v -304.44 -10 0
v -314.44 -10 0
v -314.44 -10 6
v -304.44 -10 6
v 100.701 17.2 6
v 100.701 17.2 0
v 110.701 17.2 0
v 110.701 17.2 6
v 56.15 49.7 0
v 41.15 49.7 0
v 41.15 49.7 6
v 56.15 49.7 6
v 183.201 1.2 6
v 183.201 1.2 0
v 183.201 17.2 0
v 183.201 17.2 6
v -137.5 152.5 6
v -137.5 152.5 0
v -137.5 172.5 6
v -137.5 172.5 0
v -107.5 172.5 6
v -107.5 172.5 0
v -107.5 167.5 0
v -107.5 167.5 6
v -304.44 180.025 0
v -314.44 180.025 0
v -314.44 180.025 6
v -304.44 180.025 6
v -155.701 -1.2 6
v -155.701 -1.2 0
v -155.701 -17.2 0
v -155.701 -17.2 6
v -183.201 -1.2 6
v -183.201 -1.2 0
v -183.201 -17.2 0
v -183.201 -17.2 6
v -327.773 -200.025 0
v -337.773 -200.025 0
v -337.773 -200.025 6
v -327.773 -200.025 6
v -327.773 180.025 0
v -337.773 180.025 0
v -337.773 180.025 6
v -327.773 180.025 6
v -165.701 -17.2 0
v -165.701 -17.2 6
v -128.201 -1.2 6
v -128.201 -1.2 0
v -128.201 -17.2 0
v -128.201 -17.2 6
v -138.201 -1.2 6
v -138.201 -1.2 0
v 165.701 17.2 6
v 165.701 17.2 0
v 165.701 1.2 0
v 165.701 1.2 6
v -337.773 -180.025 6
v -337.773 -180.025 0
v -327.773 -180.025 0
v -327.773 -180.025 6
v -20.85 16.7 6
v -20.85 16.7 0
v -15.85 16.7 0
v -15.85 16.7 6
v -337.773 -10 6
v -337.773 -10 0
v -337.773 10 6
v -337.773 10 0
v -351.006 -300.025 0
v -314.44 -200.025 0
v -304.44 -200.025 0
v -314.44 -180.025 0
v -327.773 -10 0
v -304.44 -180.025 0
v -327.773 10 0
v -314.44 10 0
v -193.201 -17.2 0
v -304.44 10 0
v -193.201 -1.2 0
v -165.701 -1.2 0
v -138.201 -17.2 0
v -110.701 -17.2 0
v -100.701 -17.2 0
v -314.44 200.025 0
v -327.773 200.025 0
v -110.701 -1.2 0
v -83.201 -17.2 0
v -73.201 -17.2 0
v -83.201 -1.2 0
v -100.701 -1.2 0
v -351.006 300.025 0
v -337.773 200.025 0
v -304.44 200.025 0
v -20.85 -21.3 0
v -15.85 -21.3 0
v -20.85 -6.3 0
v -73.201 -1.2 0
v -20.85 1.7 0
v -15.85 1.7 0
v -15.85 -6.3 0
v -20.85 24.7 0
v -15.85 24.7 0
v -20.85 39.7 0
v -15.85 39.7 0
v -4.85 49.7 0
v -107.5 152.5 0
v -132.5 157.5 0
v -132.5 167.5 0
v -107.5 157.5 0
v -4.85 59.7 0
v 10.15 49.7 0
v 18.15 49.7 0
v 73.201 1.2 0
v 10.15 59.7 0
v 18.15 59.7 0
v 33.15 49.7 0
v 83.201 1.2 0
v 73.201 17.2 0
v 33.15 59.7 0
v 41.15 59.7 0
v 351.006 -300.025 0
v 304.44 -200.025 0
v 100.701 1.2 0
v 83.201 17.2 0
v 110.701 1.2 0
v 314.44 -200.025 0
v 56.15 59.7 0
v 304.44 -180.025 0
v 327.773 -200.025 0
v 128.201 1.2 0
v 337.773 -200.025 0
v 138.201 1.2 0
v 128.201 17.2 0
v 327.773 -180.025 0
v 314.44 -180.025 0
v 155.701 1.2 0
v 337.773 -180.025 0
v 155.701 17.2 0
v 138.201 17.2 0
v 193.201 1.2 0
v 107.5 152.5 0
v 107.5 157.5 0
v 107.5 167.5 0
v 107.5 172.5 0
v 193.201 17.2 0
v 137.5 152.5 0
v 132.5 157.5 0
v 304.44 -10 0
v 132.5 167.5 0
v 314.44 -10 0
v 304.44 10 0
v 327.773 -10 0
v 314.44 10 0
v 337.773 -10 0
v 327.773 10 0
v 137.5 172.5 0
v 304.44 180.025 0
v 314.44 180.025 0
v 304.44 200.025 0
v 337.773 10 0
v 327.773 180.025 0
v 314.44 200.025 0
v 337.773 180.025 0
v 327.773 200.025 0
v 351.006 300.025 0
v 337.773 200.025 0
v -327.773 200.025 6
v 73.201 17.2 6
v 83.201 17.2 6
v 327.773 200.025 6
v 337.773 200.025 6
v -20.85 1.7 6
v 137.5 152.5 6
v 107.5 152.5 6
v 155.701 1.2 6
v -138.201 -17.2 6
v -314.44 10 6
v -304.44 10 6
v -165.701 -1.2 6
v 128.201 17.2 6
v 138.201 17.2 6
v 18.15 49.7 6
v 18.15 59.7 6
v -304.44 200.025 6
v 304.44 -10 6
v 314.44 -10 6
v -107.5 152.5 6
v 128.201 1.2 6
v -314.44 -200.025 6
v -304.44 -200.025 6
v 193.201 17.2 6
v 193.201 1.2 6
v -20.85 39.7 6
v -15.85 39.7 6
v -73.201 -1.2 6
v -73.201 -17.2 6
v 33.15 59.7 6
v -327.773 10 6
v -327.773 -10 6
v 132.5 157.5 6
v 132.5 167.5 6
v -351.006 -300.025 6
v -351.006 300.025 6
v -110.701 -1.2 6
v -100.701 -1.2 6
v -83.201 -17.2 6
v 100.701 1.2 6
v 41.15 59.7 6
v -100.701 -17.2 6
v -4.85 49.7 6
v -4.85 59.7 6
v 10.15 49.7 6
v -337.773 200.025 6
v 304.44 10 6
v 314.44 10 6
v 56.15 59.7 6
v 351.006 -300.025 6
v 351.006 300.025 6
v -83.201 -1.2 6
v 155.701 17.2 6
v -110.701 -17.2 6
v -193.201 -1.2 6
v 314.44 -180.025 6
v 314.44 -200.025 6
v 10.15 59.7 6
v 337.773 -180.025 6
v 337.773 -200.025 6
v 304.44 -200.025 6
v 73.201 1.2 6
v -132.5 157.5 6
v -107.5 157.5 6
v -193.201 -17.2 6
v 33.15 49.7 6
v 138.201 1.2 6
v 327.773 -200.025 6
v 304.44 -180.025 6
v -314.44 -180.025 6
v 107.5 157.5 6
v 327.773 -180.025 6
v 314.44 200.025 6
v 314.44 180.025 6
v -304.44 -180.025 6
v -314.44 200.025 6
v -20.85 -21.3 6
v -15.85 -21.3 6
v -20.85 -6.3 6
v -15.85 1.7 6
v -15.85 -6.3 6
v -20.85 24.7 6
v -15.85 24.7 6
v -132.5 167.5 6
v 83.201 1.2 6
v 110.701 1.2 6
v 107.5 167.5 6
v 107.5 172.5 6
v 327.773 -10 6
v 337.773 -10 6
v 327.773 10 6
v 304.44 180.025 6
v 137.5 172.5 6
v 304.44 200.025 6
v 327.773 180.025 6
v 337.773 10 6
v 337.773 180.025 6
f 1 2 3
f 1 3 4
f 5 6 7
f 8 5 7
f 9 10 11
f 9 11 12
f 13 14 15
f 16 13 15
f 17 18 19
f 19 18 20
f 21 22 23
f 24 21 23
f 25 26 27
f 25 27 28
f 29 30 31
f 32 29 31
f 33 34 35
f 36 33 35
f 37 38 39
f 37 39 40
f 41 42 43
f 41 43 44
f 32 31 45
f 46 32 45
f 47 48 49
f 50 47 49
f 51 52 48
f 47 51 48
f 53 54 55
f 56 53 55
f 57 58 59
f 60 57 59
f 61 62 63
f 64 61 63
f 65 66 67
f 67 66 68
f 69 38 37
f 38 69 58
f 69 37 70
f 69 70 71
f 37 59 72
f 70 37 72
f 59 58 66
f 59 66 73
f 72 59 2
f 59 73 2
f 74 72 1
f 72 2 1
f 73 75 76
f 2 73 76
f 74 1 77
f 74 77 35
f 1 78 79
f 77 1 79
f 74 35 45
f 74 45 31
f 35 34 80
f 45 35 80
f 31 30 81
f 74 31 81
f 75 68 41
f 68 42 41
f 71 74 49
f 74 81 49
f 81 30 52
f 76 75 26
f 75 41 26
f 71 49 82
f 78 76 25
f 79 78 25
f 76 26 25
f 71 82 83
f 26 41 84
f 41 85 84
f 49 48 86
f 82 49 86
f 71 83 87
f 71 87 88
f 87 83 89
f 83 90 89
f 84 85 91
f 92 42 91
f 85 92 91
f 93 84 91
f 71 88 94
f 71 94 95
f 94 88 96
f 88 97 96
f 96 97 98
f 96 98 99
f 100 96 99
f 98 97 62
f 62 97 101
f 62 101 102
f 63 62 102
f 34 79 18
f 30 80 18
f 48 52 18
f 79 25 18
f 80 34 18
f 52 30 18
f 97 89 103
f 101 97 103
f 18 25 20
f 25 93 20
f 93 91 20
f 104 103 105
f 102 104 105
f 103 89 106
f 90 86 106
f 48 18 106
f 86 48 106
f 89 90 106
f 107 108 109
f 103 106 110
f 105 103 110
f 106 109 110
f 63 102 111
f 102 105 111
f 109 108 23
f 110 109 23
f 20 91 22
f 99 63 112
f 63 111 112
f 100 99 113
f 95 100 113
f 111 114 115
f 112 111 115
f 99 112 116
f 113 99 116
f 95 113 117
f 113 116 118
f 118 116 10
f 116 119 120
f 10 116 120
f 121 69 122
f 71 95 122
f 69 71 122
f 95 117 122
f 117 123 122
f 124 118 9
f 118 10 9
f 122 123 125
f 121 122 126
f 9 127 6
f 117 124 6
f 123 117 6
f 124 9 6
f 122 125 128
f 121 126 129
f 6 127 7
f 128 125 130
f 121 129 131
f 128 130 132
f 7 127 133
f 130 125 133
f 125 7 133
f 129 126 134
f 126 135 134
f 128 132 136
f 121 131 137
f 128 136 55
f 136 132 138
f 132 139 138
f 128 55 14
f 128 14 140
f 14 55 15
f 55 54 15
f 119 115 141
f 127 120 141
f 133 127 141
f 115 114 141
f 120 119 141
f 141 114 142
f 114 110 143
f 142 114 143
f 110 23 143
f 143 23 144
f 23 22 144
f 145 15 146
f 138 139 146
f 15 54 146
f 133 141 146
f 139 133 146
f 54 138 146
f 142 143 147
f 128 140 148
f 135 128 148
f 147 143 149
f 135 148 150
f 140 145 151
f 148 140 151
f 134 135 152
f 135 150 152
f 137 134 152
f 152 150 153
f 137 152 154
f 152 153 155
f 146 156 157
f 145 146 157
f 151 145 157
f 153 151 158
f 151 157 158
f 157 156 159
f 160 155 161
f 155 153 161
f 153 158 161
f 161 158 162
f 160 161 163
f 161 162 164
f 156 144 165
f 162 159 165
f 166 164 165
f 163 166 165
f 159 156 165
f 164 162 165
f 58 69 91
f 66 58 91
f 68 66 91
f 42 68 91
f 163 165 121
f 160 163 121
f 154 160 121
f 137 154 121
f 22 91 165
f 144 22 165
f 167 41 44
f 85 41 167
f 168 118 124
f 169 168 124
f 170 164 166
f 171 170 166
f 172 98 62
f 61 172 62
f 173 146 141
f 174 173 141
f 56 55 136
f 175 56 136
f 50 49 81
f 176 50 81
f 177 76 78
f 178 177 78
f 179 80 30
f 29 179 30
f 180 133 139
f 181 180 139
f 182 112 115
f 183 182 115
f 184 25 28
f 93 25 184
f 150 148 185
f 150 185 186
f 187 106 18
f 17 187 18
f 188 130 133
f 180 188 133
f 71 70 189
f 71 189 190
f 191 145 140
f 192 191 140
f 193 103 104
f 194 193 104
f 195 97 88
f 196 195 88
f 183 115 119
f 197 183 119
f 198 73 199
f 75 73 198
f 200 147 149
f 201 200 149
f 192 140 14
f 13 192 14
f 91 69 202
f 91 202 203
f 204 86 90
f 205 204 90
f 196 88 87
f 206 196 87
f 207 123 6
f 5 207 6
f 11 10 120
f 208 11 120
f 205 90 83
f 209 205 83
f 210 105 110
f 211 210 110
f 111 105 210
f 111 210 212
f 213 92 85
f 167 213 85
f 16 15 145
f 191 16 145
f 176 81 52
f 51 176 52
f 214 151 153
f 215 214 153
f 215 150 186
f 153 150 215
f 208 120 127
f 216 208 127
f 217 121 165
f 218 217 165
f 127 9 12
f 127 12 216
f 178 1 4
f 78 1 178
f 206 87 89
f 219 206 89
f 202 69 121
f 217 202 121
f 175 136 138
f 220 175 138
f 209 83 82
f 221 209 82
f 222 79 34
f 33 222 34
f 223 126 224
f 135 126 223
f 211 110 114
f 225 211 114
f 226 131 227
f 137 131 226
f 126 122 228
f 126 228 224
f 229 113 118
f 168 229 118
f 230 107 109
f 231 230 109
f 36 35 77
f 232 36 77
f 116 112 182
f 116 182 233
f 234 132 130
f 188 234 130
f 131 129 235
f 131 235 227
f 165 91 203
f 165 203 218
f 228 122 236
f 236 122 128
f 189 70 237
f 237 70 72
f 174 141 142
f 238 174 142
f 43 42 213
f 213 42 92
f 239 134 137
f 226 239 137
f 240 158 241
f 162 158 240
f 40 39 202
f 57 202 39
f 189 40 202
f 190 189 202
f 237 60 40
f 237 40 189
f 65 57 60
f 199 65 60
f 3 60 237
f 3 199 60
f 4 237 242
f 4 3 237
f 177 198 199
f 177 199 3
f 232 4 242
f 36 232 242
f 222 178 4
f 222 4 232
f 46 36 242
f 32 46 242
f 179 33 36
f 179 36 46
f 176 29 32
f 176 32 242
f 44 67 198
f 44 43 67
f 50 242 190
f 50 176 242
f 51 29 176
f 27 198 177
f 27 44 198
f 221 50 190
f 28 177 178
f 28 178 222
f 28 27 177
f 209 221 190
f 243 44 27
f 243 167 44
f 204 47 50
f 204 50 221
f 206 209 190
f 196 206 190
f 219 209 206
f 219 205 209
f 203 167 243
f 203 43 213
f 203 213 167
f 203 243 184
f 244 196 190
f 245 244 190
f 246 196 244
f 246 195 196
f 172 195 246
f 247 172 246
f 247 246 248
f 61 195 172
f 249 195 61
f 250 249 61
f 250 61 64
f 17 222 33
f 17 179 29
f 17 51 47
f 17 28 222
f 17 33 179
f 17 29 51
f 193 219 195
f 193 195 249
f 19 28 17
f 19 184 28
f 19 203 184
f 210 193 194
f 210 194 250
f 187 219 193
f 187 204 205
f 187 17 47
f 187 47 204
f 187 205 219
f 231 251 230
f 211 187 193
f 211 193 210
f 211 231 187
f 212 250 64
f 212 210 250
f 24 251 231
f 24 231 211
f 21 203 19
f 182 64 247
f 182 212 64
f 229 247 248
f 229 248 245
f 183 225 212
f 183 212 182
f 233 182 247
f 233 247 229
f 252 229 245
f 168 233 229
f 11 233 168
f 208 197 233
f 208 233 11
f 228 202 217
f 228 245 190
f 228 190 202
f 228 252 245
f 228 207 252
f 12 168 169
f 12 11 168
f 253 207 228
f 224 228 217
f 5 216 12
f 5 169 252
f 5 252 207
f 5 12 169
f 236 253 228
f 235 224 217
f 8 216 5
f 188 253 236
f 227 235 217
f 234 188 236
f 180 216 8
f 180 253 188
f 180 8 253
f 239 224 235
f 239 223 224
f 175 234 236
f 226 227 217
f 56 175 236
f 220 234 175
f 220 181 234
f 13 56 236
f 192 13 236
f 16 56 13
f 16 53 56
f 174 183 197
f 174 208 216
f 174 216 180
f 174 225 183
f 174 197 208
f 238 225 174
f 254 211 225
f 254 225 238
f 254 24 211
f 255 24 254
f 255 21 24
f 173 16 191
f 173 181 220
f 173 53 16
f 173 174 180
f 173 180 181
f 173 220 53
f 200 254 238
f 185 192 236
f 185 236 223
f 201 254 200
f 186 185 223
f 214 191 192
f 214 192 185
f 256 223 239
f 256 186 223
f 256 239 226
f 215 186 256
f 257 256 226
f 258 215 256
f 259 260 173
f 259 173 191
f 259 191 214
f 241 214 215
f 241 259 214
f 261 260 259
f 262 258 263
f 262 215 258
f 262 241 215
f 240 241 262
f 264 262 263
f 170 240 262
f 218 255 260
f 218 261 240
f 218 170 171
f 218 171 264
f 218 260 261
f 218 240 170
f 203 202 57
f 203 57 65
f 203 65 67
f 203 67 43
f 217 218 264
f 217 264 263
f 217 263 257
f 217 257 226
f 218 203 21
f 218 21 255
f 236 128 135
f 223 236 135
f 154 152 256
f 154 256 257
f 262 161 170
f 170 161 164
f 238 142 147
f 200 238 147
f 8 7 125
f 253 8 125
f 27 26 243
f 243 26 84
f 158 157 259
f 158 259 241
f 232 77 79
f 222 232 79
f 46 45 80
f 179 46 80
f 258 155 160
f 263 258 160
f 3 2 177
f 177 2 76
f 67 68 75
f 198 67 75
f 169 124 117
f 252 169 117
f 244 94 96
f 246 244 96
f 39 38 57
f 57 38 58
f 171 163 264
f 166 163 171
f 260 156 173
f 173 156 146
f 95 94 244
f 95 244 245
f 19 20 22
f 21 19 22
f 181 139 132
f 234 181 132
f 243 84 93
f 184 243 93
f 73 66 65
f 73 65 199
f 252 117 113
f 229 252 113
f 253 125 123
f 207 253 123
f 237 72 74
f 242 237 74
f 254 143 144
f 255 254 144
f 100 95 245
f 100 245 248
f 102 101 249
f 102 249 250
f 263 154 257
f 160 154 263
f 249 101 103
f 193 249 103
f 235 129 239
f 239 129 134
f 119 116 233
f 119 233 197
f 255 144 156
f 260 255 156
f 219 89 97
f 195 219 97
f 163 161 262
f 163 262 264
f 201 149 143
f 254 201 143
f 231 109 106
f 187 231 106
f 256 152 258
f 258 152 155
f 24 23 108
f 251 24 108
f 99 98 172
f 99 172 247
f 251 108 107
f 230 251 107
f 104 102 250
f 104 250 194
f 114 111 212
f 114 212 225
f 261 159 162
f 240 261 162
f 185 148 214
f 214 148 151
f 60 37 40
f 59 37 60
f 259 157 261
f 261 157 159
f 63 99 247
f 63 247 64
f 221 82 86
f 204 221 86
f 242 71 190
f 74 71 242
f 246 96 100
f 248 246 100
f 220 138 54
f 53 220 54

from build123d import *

# Parameters (mm, degrees)
SKETCH1_W           = 702.0123615
SKETCH1_H           = 600.05
SKETCH1_W_2         = 10
SKETCH1_H_2         = 20
SKETCH1_W_3         = 5
SKETCH1_H_3         = 15
SKETCH1_W_4         = 15
SKETCH1_H_4         = 10
BOSS_EXTRUDE2_DEPTH = 6


with BuildPart() as part:
    # Sketch1 → Boss-Extrude2 (new body)
    with BuildSketch(Plane.XY):
        Rectangle(SKETCH1_W, SKETCH1_H)
        with Locations((-332.772847417, -190.025)):
            Rectangle(SKETCH1_W_2, SKETCH1_H_2, mode=Mode.SUBTRACT)
        with Locations((-309.439514083, -190.025)):
            Rectangle(SKETCH1_W_2, SKETCH1_H_2, mode=Mode.SUBTRACT)
        Polygon((-193.20062859, -9.2), (-193.20062859, -1.2), (-183.20062859, -1.2), (-183.20062859, -9.2), (-183.20062859, -17.2), (-193.20062859, -17.2), align=None, mode=Mode.SUBTRACT)
        Polygon((-155.70062859, -1.2), (-155.70062859, -9.2), (-155.70062859, -17.2), (-165.70062859, -17.2), (-165.70062859, -9.2), (-165.70062859, -1.2), align=None, mode=Mode.SUBTRACT)
        Polygon((-128.20062859, -1.2), (-128.20062859, -9.2), (-128.20062859, -17.2), (-138.20062859, -17.2), (-138.20062859, -9.2), (-138.20062859, -1.2), align=None, mode=Mode.SUBTRACT)
        Polygon((-100.70062859, -1.2), (-100.70062859, -9.2), (-100.70062859, -17.2), (-110.70062859, -17.2), (-110.70062859, -9.2), (-110.70062859, -1.2), align=None, mode=Mode.SUBTRACT)
        Polygon((-73.20062859, -1.2), (-73.20062859, -9.2), (-73.20062859, -17.2), (-83.20062859, -17.2), (-83.20062859, -9.2), (-83.20062859, -1.2), align=None, mode=Mode.SUBTRACT)
        with Locations((-18.35, -13.8)):
            Rectangle(SKETCH1_W_3, SKETCH1_H_3, mode=Mode.SUBTRACT)
        with Locations((309.439514083, -190.025)):
            Rectangle(SKETCH1_W_2, SKETCH1_H_2, mode=Mode.SUBTRACT)
        with Locations((332.772847417, -190.025)):
            Rectangle(SKETCH1_W_2, SKETCH1_H_2, mode=Mode.SUBTRACT)
        with Locations((-332.772847417, 0)):
            Rectangle(SKETCH1_W_2, SKETCH1_H_2, mode=Mode.SUBTRACT)
        with Locations((-309.439514083, 0)):
            Rectangle(SKETCH1_W_2, SKETCH1_H_2, mode=Mode.SUBTRACT)
        with Locations((-18.35, 9.2)):
            Rectangle(SKETCH1_W_3, SKETCH1_H_3, mode=Mode.SUBTRACT)
        with Locations((-18.35, 32.2)):
            Rectangle(SKETCH1_W_3, SKETCH1_H_3, mode=Mode.SUBTRACT)
        with Locations((-332.772847417, 190.025)):
            Rectangle(SKETCH1_W_2, SKETCH1_H_2, mode=Mode.SUBTRACT)
        with Locations((-309.439514083, 190.025)):
            Rectangle(SKETCH1_W_2, SKETCH1_H_2, mode=Mode.SUBTRACT)
        Polygon((-132.5, 167.5), (-132.5, 157.5), (-107.5, 157.5), (-107.5, 152.5), (-132.5, 152.5), (-137.5, 152.5), (-137.5, 172.5), (-132.5, 172.5), (-107.5, 172.5), (-107.5, 167.5), align=None, mode=Mode.SUBTRACT)
        Polygon((83.20052308, 17.2), (83.20052308, 9.2), (83.20052308, 1.2), (73.20052308, 1.2), (73.20052308, 9.2), (73.20052308, 17.2), align=None, mode=Mode.SUBTRACT)
        with Locations((2.65, 54.7)):
            Rectangle(SKETCH1_W_4, SKETCH1_H_4, mode=Mode.SUBTRACT)
        with Locations((25.65, 54.7)):
            Rectangle(SKETCH1_W_4, SKETCH1_H_4, mode=Mode.SUBTRACT)
        with Locations((48.65, 54.7)):
            Rectangle(SKETCH1_W_4, SKETCH1_H_4, mode=Mode.SUBTRACT)
        Polygon((110.70052308, 17.2), (110.70052308, 9.2), (110.70052308, 1.2), (100.70052308, 1.2), (100.70052308, 9.2), (100.70052308, 17.2), align=None, mode=Mode.SUBTRACT)
        Polygon((138.20052308, 17.2), (138.20052308, 9.2), (138.20052308, 1.2), (128.20052308, 1.2), (128.20052308, 9.2), (128.20052308, 17.2), align=None, mode=Mode.SUBTRACT)
        Polygon((165.70052308, 17.2), (165.70052308, 9.2), (165.70052308, 1.2), (155.70052308, 1.2), (155.70052308, 9.2), (155.70052308, 17.2), align=None, mode=Mode.SUBTRACT)
        Polygon((193.20052308, 17.2), (193.20052308, 9.2), (193.20052308, 1.2), (183.20052308, 1.2), (183.20052308, 9.2), (183.20052308, 17.2), align=None, mode=Mode.SUBTRACT)
        with Locations((309.439514083, 0)):
            Rectangle(SKETCH1_W_2, SKETCH1_H_2, mode=Mode.SUBTRACT)
        with Locations((332.772847417, 0)):
            Rectangle(SKETCH1_W_2, SKETCH1_H_2, mode=Mode.SUBTRACT)
        Polygon((107.5, 167.5), (107.5, 172.5), (132.5, 172.5), (137.5, 172.5), (137.5, 152.5), (132.5, 152.5), (107.5, 152.5), (107.5, 157.5), (132.5, 157.5), (132.5, 167.5), align=None, mode=Mode.SUBTRACT)
        with Locations((309.439514083, 190.025)):
            Rectangle(SKETCH1_W_2, SKETCH1_H_2, mode=Mode.SUBTRACT)
        with Locations((332.772847417, 190.025)):
            Rectangle(SKETCH1_W_2, SKETCH1_H_2, mode=Mode.SUBTRACT)
    extrude(amount=BOSS_EXTRUDE2_DEPTH)


solid = part.part
